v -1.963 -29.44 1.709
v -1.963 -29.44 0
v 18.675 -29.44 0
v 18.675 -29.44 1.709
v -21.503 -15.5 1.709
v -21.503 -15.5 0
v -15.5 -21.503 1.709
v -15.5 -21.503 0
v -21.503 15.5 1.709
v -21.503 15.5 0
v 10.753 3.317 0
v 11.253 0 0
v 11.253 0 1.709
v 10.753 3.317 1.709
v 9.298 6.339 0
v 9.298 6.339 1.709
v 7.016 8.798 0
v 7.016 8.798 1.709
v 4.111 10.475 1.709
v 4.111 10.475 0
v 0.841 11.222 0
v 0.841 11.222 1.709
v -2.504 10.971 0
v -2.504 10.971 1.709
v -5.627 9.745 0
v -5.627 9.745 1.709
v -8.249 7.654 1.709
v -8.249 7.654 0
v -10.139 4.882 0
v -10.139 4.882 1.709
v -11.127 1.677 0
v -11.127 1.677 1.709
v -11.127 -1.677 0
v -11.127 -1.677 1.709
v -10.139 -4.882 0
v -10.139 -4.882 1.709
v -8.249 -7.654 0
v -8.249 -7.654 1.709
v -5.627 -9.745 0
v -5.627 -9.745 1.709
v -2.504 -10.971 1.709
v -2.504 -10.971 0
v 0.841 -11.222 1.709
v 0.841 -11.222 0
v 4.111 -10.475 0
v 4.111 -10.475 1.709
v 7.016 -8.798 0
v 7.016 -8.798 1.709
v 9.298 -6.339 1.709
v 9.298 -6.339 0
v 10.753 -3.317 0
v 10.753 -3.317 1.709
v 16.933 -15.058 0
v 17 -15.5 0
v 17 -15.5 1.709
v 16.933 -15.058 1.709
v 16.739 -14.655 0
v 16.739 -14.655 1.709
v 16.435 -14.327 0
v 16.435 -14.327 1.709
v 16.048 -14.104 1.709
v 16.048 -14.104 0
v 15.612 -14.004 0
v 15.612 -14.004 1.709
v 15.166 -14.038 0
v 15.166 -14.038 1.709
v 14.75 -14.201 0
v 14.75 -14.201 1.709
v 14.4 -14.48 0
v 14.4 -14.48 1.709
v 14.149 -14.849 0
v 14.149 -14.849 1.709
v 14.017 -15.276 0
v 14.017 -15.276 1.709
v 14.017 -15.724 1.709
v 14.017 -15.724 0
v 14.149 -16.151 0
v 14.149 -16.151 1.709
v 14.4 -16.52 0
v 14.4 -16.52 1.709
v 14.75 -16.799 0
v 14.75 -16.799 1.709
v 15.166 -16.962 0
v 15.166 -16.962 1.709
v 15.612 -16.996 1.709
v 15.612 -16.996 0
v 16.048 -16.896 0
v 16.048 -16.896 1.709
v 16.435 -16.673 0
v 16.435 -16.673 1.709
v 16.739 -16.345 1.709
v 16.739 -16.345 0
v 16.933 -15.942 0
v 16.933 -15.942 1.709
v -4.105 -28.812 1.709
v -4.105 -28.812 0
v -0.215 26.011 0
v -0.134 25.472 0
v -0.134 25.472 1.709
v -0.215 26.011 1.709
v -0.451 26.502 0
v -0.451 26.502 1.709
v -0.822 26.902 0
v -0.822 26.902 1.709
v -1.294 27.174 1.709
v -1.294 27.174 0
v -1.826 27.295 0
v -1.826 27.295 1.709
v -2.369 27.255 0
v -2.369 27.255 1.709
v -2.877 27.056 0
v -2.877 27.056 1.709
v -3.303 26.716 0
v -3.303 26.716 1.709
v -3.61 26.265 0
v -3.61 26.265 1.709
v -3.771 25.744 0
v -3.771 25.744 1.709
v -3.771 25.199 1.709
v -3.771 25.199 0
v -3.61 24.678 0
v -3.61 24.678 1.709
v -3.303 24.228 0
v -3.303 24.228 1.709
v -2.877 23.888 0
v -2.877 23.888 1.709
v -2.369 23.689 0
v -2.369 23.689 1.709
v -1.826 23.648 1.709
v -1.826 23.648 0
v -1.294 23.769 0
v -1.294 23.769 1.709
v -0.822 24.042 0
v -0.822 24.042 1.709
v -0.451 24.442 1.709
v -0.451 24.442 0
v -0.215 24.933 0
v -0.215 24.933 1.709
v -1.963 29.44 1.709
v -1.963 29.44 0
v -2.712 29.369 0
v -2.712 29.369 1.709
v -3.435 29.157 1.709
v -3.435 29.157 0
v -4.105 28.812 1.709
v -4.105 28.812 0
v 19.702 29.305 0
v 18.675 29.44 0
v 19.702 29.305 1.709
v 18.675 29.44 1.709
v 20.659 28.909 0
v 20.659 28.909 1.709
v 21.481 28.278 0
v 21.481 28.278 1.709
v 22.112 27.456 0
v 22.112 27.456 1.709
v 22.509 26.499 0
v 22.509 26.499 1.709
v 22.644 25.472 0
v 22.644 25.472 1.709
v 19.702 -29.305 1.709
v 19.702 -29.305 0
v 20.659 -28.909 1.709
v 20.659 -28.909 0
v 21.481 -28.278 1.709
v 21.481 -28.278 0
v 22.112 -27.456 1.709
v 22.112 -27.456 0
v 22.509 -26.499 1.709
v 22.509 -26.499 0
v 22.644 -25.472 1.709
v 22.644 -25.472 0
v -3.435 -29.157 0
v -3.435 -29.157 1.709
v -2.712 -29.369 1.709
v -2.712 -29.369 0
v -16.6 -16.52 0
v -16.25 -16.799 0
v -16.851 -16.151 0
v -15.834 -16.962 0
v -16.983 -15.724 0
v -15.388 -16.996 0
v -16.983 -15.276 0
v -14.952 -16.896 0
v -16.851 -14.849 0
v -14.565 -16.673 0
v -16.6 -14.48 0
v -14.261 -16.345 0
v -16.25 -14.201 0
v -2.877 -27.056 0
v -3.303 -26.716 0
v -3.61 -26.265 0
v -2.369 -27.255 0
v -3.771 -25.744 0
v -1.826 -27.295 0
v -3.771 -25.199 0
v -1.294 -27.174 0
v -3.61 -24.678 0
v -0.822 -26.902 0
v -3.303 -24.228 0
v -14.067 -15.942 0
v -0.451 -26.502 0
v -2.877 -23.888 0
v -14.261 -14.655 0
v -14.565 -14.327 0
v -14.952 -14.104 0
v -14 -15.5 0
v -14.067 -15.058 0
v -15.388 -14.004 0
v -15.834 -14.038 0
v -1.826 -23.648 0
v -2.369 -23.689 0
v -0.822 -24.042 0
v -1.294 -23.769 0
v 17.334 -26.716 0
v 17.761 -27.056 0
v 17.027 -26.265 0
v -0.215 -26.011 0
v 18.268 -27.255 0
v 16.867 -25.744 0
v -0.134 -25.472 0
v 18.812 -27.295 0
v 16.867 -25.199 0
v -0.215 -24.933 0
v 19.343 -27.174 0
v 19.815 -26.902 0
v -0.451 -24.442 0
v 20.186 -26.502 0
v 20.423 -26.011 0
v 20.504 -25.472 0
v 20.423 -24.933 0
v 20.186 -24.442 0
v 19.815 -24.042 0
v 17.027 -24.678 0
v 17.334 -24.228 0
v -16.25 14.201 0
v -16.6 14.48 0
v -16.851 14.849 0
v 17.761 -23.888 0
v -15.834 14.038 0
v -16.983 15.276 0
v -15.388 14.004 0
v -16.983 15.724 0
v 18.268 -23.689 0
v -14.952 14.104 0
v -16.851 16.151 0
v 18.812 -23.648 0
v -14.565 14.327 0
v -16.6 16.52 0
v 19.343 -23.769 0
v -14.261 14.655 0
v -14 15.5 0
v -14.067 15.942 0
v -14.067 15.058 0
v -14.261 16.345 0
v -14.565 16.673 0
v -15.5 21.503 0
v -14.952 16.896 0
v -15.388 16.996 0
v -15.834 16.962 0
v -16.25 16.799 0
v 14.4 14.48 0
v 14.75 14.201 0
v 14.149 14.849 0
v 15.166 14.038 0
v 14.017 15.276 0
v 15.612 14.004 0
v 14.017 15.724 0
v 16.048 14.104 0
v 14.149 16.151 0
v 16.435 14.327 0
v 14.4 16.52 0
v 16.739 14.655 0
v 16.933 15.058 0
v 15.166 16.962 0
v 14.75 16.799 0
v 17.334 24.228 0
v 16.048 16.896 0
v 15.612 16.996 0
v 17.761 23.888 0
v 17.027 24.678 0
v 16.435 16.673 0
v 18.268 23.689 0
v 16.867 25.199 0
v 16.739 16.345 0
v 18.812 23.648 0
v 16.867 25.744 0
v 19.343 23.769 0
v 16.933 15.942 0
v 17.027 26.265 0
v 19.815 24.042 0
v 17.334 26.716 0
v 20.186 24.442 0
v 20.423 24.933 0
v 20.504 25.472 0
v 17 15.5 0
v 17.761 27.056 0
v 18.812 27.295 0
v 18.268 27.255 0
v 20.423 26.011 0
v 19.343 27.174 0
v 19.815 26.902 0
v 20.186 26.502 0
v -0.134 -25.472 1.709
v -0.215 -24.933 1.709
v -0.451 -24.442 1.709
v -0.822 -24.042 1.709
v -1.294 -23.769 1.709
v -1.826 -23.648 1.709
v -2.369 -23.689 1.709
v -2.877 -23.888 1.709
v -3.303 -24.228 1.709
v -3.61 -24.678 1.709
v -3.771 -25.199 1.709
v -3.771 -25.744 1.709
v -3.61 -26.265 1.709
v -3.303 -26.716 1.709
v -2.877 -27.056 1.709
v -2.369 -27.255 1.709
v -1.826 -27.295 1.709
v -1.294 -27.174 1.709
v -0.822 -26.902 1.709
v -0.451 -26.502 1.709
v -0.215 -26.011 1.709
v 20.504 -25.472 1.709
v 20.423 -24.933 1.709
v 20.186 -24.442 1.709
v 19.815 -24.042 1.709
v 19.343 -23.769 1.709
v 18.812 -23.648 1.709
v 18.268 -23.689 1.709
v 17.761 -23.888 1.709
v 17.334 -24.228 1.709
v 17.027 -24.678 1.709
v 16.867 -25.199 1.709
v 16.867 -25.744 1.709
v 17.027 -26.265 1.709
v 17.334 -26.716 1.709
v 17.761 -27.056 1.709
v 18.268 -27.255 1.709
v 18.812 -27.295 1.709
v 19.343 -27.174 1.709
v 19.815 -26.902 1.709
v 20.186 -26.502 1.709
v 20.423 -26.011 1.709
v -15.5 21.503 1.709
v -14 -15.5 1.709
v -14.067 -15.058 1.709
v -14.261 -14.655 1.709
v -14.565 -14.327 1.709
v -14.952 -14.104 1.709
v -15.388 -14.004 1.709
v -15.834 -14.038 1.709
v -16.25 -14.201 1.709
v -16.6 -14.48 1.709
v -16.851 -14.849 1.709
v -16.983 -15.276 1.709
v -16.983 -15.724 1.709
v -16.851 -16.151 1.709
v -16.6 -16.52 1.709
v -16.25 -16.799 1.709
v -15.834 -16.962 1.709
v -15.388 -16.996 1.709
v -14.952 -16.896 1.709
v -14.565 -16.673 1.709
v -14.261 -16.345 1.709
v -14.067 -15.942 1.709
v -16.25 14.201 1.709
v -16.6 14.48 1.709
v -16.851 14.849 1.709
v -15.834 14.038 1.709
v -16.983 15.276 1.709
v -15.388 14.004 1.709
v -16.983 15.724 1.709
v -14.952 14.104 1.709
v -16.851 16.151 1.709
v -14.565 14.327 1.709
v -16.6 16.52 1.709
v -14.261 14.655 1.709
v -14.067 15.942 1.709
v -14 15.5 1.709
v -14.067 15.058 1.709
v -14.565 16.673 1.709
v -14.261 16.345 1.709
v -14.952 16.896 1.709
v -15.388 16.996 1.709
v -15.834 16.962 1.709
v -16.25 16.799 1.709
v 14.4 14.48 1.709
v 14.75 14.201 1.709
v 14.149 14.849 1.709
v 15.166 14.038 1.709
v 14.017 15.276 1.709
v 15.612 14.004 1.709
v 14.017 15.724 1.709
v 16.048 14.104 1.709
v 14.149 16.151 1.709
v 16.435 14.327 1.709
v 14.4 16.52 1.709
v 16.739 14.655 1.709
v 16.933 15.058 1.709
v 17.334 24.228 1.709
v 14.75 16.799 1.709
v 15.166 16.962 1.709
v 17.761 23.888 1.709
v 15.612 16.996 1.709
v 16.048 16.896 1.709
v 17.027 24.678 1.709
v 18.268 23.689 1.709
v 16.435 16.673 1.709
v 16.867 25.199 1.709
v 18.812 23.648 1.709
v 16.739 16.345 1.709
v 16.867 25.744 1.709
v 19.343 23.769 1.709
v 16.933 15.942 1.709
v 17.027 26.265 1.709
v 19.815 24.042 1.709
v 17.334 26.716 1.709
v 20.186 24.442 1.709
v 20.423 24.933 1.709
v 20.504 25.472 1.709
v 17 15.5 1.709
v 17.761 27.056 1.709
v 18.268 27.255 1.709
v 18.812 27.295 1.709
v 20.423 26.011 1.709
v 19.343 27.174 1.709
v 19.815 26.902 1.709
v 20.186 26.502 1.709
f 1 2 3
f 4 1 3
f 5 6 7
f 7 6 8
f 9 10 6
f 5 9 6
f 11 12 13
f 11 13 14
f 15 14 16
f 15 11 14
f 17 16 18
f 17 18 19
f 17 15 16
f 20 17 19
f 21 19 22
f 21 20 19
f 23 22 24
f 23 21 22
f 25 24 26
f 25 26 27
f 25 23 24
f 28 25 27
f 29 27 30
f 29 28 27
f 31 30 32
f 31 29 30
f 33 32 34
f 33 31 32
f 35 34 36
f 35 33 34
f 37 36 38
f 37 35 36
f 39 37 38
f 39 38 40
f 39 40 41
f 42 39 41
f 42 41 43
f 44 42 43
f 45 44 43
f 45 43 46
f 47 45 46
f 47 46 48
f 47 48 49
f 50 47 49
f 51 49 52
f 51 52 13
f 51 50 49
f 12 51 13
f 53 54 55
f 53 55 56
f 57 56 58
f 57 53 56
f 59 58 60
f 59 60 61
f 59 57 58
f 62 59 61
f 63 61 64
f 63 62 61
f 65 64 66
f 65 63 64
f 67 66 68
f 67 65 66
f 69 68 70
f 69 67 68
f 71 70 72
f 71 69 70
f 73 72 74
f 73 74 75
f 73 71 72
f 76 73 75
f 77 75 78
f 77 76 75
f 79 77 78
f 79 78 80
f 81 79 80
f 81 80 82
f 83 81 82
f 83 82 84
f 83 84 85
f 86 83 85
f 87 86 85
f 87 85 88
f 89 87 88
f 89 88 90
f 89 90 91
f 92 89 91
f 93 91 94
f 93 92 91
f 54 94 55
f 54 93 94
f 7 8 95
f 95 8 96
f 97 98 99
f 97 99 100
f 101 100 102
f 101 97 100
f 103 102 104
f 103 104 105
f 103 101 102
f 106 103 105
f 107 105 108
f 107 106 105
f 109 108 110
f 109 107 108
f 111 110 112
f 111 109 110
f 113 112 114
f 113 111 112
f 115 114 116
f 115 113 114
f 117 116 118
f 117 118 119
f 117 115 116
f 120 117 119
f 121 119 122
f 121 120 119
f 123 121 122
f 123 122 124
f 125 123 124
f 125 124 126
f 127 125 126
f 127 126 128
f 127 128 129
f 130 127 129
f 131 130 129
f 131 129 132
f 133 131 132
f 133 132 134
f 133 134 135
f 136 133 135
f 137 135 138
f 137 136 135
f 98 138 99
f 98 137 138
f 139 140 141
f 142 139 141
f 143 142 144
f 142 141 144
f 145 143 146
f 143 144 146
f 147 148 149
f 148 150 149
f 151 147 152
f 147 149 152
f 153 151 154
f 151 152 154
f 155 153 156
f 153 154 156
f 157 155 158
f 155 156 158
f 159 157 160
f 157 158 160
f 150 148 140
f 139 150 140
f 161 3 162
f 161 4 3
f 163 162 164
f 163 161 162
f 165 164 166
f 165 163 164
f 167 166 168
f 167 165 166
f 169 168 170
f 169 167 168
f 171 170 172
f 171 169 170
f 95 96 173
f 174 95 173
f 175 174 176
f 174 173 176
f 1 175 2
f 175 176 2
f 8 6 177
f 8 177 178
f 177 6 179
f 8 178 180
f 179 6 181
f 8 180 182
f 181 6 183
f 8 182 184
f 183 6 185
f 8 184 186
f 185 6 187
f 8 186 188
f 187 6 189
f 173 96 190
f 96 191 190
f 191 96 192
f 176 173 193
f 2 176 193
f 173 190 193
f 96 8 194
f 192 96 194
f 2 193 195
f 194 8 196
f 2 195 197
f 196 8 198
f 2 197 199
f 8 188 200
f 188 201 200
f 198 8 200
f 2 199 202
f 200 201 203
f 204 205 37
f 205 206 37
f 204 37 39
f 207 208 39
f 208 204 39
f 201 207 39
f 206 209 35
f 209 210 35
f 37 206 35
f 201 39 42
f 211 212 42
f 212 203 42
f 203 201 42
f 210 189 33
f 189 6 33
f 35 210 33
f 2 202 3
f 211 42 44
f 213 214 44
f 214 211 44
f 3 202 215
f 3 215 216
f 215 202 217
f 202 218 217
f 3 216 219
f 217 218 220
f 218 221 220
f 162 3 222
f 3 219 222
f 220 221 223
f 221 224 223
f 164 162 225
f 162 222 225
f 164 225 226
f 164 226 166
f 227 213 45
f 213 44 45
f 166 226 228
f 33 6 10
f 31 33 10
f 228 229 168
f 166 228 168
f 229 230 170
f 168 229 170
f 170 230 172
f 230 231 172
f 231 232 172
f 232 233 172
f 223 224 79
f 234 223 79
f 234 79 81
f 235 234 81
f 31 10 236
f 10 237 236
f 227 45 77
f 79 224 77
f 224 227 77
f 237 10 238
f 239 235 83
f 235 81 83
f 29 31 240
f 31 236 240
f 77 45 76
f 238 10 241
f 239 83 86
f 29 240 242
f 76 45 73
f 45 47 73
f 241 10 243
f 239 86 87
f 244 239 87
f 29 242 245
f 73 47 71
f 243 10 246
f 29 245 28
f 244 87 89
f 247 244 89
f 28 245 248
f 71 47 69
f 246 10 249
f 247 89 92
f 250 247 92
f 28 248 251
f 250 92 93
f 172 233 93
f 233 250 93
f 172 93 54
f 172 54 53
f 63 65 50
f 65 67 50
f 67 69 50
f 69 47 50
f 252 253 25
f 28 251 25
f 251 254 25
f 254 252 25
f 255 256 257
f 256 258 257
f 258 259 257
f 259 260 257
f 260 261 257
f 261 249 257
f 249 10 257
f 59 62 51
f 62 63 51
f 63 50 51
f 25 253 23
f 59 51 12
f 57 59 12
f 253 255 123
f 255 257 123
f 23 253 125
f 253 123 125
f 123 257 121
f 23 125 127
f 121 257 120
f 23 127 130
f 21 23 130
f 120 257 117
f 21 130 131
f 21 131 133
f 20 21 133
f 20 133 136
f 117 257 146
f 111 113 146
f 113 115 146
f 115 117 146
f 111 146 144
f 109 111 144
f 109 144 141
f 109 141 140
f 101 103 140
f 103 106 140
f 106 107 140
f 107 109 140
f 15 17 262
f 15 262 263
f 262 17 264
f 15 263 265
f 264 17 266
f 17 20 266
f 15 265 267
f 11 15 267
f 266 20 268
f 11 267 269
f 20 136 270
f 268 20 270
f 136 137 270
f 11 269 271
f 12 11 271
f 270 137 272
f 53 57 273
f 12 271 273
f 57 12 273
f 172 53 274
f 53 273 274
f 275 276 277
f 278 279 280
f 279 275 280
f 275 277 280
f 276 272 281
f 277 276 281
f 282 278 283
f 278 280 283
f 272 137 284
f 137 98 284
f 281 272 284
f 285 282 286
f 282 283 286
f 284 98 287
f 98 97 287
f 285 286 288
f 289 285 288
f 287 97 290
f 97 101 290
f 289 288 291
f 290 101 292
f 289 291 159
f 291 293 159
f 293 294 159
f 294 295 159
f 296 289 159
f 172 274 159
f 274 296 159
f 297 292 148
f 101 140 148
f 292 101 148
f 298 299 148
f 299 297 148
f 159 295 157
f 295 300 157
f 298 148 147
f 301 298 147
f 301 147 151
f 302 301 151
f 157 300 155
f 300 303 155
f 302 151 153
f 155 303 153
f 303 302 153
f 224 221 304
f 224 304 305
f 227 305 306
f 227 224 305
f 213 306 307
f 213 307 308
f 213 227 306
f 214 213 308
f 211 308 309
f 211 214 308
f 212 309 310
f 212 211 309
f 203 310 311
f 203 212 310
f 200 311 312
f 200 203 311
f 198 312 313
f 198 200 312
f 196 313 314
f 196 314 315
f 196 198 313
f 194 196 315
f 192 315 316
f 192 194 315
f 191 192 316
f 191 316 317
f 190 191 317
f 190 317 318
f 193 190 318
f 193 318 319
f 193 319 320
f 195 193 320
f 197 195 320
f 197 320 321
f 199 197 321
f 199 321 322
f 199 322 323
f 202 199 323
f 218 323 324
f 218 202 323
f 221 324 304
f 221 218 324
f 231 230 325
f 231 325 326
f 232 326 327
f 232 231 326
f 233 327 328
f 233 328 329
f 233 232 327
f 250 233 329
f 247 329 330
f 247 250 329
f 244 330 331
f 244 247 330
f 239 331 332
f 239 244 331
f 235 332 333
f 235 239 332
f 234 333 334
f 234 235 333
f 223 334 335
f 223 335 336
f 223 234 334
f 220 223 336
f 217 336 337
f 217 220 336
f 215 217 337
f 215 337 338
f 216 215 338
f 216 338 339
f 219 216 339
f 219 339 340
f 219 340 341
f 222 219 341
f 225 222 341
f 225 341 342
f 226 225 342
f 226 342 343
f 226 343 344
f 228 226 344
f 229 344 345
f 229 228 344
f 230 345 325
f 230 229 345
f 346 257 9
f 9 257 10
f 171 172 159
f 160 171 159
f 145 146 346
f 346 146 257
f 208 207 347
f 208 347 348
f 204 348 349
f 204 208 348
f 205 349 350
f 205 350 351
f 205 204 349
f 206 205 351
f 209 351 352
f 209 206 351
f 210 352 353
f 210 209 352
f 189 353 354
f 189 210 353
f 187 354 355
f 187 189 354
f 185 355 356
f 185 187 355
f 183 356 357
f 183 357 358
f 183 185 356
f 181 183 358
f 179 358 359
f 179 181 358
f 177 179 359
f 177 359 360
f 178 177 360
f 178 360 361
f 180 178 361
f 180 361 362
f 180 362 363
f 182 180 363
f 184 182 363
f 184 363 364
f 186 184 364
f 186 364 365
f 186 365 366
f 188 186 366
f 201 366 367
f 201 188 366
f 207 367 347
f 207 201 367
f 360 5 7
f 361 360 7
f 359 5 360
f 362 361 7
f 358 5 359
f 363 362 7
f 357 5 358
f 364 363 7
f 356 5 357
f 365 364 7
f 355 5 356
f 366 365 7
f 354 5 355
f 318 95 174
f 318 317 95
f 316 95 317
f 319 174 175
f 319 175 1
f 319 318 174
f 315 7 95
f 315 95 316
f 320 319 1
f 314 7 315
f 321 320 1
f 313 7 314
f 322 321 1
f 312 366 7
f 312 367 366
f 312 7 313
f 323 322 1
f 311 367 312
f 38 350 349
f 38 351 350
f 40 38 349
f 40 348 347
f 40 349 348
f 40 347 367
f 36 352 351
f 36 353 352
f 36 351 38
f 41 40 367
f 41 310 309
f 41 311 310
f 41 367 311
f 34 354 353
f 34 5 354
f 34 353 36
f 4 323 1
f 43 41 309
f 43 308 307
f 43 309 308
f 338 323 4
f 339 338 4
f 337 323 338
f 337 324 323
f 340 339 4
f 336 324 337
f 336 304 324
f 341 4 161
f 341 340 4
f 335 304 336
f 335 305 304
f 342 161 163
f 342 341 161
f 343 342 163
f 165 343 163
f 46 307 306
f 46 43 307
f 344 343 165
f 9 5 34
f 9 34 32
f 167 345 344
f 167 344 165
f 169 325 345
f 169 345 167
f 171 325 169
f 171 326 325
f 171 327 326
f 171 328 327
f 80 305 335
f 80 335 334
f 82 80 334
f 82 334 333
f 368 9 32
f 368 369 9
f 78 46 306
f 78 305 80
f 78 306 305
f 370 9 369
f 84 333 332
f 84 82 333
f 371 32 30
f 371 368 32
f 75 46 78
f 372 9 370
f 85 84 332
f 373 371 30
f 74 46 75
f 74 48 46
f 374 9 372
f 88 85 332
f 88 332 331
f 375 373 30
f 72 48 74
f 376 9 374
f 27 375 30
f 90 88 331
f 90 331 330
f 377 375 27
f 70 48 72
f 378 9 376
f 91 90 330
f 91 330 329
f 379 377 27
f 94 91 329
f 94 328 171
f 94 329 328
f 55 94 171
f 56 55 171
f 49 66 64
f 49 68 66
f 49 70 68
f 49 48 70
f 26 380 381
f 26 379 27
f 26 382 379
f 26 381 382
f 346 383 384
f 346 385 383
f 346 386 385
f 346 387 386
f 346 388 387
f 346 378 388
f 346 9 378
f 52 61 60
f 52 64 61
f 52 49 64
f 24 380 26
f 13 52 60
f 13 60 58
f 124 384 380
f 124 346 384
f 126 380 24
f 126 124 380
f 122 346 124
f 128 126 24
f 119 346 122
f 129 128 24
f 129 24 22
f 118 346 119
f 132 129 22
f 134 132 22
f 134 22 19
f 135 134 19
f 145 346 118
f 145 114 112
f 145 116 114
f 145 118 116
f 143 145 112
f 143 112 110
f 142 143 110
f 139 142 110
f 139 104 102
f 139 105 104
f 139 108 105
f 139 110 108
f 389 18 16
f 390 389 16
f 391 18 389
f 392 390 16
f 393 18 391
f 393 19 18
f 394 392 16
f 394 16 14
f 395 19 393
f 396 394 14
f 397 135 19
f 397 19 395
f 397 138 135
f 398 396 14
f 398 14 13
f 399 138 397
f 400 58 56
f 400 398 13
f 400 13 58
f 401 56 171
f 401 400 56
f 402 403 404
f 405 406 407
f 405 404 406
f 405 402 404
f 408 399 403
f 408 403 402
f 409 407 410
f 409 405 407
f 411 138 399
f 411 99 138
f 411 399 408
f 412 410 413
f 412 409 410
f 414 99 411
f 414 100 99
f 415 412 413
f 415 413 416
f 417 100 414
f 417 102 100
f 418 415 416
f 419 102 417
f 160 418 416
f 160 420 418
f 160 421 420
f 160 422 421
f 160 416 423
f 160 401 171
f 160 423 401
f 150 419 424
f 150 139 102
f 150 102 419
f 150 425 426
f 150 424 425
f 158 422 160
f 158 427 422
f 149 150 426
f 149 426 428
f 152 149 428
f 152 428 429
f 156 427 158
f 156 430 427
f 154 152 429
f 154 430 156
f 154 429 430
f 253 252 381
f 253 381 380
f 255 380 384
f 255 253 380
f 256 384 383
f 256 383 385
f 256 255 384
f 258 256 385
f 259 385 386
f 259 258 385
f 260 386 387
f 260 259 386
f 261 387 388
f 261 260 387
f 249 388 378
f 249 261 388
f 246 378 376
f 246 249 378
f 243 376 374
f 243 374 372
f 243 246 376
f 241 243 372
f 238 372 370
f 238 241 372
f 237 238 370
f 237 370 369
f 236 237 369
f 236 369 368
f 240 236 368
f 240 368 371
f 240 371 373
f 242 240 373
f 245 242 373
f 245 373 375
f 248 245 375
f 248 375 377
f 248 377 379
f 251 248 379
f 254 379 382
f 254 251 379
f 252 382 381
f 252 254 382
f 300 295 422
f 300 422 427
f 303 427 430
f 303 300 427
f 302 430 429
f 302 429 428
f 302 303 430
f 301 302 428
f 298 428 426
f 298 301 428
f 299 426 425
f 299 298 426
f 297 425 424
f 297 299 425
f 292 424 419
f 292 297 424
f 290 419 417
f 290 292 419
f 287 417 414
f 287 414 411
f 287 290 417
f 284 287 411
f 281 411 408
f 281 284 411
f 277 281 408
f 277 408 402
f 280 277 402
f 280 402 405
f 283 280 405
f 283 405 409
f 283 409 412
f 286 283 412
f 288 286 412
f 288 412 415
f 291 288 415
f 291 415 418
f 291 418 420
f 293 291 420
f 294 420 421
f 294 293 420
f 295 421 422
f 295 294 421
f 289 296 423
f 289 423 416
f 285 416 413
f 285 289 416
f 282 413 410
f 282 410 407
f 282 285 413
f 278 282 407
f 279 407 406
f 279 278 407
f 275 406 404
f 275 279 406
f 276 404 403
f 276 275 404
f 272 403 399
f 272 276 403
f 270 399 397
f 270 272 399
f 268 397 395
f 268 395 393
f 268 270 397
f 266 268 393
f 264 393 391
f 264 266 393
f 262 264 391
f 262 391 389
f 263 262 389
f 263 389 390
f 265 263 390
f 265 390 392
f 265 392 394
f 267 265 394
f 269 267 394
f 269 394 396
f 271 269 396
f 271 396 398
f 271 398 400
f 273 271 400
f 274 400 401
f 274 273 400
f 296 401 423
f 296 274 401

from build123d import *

# Parameters (mm, degrees)
F0_R     = 1.5
F0_R_2   = 1.8288
F0_R_3   = 11.253
F1_DEPTH = 1.70942
F2_R     = 3.96875


with BuildPart() as f1:
    # F0 (on Top) → F1 (new body)
    with BuildSketch(Plane.XY):
        with BuildLine():
            Line((-21.502992, 15.499982), (-21.502992, -15.499982))
            Line((-21.502992, -15.499982), (-15.499982, -21.502992))
            Line((-15.499982, -21.502992), (-4.105352, -28.812279))
            ThreePointArc((-4.105352, -28.812279), (-3.079023, -29.280202), (-1.962506, -29.440492))
            Line((-1.962506, -29.440492), (22.643744, -29.440492))
            Line((22.643744, -29.440492), (22.643744, 29.440492))
            Line((22.643744, 29.440492), (-1.962506, 29.440492))
            ThreePointArc((-1.962506, 29.440492), (-3.079023, 29.280202), (-4.105352, 28.812279))
            Line((-4.105352, 28.812279), (-15.499982, 21.502992))
            Line((-15.499982, 21.502992), (-21.502992, 15.499982))
        make_face()
        with Locations((-15.499994, -15.499994)):
            Circle(F0_R, mode=Mode.SUBTRACT)
        with Locations((-1.962506, -25.471742)):
            Circle(F0_R_2, mode=Mode.SUBTRACT)
        with Locations((18.674994, -25.471742)):
            Circle(F0_R_2, mode=Mode.SUBTRACT)
        with Locations((15.499994, -15.499994)):
            Circle(F0_R, mode=Mode.SUBTRACT)
        Circle(F0_R_3, mode=Mode.SUBTRACT)
        with Locations((-15.499994, 15.499994)):
            Circle(F0_R, mode=Mode.SUBTRACT)
        with Locations((-1.962506, 25.471742)):
            Circle(F0_R_2, mode=Mode.SUBTRACT)
        with Locations((15.499994, 15.499994)):
            Circle(F0_R, mode=Mode.SUBTRACT)
        with Locations((18.674994, 25.471742)):
            Circle(F0_R_2, mode=Mode.SUBTRACT)
    extrude(amount=F1_DEPTH)

    # F2
    f2_edges = [f1.edges().sort_by_distance(p)[0] for p in [
        (22.643744, -29.440492, 0.85471),
        (22.643744, 29.440492, 0.85471),
    ]]
    fillet(f2_edges, radius=F2_R)


solid = f1.part
